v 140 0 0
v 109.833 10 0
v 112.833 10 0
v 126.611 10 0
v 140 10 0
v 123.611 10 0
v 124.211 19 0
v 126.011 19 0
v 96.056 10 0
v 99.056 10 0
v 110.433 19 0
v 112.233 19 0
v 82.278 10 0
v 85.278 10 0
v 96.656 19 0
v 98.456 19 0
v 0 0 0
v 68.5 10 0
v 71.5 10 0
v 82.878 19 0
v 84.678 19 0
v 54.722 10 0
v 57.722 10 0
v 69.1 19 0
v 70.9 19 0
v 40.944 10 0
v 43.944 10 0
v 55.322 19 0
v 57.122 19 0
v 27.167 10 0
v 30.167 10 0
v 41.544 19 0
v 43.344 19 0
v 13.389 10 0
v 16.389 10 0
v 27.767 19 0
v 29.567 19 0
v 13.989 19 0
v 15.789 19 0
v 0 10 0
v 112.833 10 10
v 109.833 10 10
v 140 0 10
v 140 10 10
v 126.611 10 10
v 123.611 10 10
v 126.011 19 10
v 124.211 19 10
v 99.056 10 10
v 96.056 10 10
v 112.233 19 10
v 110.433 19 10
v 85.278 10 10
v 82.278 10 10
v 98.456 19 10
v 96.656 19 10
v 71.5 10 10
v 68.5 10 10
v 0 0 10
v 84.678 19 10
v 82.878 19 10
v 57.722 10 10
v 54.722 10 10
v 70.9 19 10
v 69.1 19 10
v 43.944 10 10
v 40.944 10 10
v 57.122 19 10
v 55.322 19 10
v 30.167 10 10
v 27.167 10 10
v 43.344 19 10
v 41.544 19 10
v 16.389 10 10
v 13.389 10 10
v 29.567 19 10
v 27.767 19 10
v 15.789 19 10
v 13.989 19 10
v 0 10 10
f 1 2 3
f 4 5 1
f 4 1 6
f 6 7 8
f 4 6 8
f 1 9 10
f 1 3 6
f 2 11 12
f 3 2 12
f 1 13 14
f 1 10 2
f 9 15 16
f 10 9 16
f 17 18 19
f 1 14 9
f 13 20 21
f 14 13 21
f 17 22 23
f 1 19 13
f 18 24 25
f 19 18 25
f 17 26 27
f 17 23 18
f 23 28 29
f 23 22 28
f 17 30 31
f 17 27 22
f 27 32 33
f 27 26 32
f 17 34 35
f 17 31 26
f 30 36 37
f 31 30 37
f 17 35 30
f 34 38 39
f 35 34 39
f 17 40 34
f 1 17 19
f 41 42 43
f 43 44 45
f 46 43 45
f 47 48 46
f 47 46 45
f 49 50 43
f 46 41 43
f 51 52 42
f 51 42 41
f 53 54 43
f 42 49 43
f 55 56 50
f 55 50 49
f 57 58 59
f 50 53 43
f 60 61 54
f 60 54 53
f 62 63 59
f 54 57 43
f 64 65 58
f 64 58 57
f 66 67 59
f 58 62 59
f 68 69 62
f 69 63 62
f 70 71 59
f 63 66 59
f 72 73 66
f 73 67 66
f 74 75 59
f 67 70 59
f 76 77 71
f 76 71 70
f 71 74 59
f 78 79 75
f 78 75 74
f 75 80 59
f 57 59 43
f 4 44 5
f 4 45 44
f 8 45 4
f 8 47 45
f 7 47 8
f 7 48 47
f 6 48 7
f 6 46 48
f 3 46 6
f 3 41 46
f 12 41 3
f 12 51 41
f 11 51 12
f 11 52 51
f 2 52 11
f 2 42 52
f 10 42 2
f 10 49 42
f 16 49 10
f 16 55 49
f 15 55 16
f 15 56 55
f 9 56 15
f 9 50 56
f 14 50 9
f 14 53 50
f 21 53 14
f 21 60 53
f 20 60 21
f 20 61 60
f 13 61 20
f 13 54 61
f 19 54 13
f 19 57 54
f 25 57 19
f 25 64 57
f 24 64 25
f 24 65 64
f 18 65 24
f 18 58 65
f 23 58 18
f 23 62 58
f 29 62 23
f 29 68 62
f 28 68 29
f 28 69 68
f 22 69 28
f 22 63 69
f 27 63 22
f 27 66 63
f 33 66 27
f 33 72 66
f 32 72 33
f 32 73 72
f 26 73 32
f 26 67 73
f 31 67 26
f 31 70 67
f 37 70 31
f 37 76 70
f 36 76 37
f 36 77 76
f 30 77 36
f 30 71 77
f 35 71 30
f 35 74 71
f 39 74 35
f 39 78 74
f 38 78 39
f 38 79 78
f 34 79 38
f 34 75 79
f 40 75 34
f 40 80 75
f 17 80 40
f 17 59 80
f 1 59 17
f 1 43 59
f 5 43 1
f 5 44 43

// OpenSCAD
$fn = 32;

// ----------------------------------------------------------------------
// Gear rack: 9 teeth on a 140 mm bar, pitch 13.78 mm
// ----------------------------------------------------------------------

// --- parameters (mm) ---
profile_height = 10;      // extrusion height
profile_points = 40;      // points of the closed outline

profile = [[0, 0], [140, 0], [140, 10], [126.611, 10], [126.011, 19], [124.211, 19], [123.611, 10], [112.833, 10], [112.233, 19], [110.433, 19], [109.833, 10], [99.056, 10], [98.456, 19], [96.656, 19], [96.056, 10], [85.278, 10], [84.678, 19], [82.878, 19], [82.278, 10], [71.5, 10], [70.9, 19], [69.1, 19], [68.5, 10], [57.722, 10], [57.122, 19], [55.322, 19], [54.722, 10], [43.944, 10], [43.344, 19], [41.544, 19], [40.944, 10], [30.167, 10], [29.567, 19], [27.767, 19], [27.167, 10], [16.389, 10], [15.789, 19], [13.989, 19], [13.389, 10], [0, 10]];  // single closed polygon, 40 points, counter clockwise

// --- the one profile operation ---
linear_extrude(height = profile_height) polygon(points = profile);
